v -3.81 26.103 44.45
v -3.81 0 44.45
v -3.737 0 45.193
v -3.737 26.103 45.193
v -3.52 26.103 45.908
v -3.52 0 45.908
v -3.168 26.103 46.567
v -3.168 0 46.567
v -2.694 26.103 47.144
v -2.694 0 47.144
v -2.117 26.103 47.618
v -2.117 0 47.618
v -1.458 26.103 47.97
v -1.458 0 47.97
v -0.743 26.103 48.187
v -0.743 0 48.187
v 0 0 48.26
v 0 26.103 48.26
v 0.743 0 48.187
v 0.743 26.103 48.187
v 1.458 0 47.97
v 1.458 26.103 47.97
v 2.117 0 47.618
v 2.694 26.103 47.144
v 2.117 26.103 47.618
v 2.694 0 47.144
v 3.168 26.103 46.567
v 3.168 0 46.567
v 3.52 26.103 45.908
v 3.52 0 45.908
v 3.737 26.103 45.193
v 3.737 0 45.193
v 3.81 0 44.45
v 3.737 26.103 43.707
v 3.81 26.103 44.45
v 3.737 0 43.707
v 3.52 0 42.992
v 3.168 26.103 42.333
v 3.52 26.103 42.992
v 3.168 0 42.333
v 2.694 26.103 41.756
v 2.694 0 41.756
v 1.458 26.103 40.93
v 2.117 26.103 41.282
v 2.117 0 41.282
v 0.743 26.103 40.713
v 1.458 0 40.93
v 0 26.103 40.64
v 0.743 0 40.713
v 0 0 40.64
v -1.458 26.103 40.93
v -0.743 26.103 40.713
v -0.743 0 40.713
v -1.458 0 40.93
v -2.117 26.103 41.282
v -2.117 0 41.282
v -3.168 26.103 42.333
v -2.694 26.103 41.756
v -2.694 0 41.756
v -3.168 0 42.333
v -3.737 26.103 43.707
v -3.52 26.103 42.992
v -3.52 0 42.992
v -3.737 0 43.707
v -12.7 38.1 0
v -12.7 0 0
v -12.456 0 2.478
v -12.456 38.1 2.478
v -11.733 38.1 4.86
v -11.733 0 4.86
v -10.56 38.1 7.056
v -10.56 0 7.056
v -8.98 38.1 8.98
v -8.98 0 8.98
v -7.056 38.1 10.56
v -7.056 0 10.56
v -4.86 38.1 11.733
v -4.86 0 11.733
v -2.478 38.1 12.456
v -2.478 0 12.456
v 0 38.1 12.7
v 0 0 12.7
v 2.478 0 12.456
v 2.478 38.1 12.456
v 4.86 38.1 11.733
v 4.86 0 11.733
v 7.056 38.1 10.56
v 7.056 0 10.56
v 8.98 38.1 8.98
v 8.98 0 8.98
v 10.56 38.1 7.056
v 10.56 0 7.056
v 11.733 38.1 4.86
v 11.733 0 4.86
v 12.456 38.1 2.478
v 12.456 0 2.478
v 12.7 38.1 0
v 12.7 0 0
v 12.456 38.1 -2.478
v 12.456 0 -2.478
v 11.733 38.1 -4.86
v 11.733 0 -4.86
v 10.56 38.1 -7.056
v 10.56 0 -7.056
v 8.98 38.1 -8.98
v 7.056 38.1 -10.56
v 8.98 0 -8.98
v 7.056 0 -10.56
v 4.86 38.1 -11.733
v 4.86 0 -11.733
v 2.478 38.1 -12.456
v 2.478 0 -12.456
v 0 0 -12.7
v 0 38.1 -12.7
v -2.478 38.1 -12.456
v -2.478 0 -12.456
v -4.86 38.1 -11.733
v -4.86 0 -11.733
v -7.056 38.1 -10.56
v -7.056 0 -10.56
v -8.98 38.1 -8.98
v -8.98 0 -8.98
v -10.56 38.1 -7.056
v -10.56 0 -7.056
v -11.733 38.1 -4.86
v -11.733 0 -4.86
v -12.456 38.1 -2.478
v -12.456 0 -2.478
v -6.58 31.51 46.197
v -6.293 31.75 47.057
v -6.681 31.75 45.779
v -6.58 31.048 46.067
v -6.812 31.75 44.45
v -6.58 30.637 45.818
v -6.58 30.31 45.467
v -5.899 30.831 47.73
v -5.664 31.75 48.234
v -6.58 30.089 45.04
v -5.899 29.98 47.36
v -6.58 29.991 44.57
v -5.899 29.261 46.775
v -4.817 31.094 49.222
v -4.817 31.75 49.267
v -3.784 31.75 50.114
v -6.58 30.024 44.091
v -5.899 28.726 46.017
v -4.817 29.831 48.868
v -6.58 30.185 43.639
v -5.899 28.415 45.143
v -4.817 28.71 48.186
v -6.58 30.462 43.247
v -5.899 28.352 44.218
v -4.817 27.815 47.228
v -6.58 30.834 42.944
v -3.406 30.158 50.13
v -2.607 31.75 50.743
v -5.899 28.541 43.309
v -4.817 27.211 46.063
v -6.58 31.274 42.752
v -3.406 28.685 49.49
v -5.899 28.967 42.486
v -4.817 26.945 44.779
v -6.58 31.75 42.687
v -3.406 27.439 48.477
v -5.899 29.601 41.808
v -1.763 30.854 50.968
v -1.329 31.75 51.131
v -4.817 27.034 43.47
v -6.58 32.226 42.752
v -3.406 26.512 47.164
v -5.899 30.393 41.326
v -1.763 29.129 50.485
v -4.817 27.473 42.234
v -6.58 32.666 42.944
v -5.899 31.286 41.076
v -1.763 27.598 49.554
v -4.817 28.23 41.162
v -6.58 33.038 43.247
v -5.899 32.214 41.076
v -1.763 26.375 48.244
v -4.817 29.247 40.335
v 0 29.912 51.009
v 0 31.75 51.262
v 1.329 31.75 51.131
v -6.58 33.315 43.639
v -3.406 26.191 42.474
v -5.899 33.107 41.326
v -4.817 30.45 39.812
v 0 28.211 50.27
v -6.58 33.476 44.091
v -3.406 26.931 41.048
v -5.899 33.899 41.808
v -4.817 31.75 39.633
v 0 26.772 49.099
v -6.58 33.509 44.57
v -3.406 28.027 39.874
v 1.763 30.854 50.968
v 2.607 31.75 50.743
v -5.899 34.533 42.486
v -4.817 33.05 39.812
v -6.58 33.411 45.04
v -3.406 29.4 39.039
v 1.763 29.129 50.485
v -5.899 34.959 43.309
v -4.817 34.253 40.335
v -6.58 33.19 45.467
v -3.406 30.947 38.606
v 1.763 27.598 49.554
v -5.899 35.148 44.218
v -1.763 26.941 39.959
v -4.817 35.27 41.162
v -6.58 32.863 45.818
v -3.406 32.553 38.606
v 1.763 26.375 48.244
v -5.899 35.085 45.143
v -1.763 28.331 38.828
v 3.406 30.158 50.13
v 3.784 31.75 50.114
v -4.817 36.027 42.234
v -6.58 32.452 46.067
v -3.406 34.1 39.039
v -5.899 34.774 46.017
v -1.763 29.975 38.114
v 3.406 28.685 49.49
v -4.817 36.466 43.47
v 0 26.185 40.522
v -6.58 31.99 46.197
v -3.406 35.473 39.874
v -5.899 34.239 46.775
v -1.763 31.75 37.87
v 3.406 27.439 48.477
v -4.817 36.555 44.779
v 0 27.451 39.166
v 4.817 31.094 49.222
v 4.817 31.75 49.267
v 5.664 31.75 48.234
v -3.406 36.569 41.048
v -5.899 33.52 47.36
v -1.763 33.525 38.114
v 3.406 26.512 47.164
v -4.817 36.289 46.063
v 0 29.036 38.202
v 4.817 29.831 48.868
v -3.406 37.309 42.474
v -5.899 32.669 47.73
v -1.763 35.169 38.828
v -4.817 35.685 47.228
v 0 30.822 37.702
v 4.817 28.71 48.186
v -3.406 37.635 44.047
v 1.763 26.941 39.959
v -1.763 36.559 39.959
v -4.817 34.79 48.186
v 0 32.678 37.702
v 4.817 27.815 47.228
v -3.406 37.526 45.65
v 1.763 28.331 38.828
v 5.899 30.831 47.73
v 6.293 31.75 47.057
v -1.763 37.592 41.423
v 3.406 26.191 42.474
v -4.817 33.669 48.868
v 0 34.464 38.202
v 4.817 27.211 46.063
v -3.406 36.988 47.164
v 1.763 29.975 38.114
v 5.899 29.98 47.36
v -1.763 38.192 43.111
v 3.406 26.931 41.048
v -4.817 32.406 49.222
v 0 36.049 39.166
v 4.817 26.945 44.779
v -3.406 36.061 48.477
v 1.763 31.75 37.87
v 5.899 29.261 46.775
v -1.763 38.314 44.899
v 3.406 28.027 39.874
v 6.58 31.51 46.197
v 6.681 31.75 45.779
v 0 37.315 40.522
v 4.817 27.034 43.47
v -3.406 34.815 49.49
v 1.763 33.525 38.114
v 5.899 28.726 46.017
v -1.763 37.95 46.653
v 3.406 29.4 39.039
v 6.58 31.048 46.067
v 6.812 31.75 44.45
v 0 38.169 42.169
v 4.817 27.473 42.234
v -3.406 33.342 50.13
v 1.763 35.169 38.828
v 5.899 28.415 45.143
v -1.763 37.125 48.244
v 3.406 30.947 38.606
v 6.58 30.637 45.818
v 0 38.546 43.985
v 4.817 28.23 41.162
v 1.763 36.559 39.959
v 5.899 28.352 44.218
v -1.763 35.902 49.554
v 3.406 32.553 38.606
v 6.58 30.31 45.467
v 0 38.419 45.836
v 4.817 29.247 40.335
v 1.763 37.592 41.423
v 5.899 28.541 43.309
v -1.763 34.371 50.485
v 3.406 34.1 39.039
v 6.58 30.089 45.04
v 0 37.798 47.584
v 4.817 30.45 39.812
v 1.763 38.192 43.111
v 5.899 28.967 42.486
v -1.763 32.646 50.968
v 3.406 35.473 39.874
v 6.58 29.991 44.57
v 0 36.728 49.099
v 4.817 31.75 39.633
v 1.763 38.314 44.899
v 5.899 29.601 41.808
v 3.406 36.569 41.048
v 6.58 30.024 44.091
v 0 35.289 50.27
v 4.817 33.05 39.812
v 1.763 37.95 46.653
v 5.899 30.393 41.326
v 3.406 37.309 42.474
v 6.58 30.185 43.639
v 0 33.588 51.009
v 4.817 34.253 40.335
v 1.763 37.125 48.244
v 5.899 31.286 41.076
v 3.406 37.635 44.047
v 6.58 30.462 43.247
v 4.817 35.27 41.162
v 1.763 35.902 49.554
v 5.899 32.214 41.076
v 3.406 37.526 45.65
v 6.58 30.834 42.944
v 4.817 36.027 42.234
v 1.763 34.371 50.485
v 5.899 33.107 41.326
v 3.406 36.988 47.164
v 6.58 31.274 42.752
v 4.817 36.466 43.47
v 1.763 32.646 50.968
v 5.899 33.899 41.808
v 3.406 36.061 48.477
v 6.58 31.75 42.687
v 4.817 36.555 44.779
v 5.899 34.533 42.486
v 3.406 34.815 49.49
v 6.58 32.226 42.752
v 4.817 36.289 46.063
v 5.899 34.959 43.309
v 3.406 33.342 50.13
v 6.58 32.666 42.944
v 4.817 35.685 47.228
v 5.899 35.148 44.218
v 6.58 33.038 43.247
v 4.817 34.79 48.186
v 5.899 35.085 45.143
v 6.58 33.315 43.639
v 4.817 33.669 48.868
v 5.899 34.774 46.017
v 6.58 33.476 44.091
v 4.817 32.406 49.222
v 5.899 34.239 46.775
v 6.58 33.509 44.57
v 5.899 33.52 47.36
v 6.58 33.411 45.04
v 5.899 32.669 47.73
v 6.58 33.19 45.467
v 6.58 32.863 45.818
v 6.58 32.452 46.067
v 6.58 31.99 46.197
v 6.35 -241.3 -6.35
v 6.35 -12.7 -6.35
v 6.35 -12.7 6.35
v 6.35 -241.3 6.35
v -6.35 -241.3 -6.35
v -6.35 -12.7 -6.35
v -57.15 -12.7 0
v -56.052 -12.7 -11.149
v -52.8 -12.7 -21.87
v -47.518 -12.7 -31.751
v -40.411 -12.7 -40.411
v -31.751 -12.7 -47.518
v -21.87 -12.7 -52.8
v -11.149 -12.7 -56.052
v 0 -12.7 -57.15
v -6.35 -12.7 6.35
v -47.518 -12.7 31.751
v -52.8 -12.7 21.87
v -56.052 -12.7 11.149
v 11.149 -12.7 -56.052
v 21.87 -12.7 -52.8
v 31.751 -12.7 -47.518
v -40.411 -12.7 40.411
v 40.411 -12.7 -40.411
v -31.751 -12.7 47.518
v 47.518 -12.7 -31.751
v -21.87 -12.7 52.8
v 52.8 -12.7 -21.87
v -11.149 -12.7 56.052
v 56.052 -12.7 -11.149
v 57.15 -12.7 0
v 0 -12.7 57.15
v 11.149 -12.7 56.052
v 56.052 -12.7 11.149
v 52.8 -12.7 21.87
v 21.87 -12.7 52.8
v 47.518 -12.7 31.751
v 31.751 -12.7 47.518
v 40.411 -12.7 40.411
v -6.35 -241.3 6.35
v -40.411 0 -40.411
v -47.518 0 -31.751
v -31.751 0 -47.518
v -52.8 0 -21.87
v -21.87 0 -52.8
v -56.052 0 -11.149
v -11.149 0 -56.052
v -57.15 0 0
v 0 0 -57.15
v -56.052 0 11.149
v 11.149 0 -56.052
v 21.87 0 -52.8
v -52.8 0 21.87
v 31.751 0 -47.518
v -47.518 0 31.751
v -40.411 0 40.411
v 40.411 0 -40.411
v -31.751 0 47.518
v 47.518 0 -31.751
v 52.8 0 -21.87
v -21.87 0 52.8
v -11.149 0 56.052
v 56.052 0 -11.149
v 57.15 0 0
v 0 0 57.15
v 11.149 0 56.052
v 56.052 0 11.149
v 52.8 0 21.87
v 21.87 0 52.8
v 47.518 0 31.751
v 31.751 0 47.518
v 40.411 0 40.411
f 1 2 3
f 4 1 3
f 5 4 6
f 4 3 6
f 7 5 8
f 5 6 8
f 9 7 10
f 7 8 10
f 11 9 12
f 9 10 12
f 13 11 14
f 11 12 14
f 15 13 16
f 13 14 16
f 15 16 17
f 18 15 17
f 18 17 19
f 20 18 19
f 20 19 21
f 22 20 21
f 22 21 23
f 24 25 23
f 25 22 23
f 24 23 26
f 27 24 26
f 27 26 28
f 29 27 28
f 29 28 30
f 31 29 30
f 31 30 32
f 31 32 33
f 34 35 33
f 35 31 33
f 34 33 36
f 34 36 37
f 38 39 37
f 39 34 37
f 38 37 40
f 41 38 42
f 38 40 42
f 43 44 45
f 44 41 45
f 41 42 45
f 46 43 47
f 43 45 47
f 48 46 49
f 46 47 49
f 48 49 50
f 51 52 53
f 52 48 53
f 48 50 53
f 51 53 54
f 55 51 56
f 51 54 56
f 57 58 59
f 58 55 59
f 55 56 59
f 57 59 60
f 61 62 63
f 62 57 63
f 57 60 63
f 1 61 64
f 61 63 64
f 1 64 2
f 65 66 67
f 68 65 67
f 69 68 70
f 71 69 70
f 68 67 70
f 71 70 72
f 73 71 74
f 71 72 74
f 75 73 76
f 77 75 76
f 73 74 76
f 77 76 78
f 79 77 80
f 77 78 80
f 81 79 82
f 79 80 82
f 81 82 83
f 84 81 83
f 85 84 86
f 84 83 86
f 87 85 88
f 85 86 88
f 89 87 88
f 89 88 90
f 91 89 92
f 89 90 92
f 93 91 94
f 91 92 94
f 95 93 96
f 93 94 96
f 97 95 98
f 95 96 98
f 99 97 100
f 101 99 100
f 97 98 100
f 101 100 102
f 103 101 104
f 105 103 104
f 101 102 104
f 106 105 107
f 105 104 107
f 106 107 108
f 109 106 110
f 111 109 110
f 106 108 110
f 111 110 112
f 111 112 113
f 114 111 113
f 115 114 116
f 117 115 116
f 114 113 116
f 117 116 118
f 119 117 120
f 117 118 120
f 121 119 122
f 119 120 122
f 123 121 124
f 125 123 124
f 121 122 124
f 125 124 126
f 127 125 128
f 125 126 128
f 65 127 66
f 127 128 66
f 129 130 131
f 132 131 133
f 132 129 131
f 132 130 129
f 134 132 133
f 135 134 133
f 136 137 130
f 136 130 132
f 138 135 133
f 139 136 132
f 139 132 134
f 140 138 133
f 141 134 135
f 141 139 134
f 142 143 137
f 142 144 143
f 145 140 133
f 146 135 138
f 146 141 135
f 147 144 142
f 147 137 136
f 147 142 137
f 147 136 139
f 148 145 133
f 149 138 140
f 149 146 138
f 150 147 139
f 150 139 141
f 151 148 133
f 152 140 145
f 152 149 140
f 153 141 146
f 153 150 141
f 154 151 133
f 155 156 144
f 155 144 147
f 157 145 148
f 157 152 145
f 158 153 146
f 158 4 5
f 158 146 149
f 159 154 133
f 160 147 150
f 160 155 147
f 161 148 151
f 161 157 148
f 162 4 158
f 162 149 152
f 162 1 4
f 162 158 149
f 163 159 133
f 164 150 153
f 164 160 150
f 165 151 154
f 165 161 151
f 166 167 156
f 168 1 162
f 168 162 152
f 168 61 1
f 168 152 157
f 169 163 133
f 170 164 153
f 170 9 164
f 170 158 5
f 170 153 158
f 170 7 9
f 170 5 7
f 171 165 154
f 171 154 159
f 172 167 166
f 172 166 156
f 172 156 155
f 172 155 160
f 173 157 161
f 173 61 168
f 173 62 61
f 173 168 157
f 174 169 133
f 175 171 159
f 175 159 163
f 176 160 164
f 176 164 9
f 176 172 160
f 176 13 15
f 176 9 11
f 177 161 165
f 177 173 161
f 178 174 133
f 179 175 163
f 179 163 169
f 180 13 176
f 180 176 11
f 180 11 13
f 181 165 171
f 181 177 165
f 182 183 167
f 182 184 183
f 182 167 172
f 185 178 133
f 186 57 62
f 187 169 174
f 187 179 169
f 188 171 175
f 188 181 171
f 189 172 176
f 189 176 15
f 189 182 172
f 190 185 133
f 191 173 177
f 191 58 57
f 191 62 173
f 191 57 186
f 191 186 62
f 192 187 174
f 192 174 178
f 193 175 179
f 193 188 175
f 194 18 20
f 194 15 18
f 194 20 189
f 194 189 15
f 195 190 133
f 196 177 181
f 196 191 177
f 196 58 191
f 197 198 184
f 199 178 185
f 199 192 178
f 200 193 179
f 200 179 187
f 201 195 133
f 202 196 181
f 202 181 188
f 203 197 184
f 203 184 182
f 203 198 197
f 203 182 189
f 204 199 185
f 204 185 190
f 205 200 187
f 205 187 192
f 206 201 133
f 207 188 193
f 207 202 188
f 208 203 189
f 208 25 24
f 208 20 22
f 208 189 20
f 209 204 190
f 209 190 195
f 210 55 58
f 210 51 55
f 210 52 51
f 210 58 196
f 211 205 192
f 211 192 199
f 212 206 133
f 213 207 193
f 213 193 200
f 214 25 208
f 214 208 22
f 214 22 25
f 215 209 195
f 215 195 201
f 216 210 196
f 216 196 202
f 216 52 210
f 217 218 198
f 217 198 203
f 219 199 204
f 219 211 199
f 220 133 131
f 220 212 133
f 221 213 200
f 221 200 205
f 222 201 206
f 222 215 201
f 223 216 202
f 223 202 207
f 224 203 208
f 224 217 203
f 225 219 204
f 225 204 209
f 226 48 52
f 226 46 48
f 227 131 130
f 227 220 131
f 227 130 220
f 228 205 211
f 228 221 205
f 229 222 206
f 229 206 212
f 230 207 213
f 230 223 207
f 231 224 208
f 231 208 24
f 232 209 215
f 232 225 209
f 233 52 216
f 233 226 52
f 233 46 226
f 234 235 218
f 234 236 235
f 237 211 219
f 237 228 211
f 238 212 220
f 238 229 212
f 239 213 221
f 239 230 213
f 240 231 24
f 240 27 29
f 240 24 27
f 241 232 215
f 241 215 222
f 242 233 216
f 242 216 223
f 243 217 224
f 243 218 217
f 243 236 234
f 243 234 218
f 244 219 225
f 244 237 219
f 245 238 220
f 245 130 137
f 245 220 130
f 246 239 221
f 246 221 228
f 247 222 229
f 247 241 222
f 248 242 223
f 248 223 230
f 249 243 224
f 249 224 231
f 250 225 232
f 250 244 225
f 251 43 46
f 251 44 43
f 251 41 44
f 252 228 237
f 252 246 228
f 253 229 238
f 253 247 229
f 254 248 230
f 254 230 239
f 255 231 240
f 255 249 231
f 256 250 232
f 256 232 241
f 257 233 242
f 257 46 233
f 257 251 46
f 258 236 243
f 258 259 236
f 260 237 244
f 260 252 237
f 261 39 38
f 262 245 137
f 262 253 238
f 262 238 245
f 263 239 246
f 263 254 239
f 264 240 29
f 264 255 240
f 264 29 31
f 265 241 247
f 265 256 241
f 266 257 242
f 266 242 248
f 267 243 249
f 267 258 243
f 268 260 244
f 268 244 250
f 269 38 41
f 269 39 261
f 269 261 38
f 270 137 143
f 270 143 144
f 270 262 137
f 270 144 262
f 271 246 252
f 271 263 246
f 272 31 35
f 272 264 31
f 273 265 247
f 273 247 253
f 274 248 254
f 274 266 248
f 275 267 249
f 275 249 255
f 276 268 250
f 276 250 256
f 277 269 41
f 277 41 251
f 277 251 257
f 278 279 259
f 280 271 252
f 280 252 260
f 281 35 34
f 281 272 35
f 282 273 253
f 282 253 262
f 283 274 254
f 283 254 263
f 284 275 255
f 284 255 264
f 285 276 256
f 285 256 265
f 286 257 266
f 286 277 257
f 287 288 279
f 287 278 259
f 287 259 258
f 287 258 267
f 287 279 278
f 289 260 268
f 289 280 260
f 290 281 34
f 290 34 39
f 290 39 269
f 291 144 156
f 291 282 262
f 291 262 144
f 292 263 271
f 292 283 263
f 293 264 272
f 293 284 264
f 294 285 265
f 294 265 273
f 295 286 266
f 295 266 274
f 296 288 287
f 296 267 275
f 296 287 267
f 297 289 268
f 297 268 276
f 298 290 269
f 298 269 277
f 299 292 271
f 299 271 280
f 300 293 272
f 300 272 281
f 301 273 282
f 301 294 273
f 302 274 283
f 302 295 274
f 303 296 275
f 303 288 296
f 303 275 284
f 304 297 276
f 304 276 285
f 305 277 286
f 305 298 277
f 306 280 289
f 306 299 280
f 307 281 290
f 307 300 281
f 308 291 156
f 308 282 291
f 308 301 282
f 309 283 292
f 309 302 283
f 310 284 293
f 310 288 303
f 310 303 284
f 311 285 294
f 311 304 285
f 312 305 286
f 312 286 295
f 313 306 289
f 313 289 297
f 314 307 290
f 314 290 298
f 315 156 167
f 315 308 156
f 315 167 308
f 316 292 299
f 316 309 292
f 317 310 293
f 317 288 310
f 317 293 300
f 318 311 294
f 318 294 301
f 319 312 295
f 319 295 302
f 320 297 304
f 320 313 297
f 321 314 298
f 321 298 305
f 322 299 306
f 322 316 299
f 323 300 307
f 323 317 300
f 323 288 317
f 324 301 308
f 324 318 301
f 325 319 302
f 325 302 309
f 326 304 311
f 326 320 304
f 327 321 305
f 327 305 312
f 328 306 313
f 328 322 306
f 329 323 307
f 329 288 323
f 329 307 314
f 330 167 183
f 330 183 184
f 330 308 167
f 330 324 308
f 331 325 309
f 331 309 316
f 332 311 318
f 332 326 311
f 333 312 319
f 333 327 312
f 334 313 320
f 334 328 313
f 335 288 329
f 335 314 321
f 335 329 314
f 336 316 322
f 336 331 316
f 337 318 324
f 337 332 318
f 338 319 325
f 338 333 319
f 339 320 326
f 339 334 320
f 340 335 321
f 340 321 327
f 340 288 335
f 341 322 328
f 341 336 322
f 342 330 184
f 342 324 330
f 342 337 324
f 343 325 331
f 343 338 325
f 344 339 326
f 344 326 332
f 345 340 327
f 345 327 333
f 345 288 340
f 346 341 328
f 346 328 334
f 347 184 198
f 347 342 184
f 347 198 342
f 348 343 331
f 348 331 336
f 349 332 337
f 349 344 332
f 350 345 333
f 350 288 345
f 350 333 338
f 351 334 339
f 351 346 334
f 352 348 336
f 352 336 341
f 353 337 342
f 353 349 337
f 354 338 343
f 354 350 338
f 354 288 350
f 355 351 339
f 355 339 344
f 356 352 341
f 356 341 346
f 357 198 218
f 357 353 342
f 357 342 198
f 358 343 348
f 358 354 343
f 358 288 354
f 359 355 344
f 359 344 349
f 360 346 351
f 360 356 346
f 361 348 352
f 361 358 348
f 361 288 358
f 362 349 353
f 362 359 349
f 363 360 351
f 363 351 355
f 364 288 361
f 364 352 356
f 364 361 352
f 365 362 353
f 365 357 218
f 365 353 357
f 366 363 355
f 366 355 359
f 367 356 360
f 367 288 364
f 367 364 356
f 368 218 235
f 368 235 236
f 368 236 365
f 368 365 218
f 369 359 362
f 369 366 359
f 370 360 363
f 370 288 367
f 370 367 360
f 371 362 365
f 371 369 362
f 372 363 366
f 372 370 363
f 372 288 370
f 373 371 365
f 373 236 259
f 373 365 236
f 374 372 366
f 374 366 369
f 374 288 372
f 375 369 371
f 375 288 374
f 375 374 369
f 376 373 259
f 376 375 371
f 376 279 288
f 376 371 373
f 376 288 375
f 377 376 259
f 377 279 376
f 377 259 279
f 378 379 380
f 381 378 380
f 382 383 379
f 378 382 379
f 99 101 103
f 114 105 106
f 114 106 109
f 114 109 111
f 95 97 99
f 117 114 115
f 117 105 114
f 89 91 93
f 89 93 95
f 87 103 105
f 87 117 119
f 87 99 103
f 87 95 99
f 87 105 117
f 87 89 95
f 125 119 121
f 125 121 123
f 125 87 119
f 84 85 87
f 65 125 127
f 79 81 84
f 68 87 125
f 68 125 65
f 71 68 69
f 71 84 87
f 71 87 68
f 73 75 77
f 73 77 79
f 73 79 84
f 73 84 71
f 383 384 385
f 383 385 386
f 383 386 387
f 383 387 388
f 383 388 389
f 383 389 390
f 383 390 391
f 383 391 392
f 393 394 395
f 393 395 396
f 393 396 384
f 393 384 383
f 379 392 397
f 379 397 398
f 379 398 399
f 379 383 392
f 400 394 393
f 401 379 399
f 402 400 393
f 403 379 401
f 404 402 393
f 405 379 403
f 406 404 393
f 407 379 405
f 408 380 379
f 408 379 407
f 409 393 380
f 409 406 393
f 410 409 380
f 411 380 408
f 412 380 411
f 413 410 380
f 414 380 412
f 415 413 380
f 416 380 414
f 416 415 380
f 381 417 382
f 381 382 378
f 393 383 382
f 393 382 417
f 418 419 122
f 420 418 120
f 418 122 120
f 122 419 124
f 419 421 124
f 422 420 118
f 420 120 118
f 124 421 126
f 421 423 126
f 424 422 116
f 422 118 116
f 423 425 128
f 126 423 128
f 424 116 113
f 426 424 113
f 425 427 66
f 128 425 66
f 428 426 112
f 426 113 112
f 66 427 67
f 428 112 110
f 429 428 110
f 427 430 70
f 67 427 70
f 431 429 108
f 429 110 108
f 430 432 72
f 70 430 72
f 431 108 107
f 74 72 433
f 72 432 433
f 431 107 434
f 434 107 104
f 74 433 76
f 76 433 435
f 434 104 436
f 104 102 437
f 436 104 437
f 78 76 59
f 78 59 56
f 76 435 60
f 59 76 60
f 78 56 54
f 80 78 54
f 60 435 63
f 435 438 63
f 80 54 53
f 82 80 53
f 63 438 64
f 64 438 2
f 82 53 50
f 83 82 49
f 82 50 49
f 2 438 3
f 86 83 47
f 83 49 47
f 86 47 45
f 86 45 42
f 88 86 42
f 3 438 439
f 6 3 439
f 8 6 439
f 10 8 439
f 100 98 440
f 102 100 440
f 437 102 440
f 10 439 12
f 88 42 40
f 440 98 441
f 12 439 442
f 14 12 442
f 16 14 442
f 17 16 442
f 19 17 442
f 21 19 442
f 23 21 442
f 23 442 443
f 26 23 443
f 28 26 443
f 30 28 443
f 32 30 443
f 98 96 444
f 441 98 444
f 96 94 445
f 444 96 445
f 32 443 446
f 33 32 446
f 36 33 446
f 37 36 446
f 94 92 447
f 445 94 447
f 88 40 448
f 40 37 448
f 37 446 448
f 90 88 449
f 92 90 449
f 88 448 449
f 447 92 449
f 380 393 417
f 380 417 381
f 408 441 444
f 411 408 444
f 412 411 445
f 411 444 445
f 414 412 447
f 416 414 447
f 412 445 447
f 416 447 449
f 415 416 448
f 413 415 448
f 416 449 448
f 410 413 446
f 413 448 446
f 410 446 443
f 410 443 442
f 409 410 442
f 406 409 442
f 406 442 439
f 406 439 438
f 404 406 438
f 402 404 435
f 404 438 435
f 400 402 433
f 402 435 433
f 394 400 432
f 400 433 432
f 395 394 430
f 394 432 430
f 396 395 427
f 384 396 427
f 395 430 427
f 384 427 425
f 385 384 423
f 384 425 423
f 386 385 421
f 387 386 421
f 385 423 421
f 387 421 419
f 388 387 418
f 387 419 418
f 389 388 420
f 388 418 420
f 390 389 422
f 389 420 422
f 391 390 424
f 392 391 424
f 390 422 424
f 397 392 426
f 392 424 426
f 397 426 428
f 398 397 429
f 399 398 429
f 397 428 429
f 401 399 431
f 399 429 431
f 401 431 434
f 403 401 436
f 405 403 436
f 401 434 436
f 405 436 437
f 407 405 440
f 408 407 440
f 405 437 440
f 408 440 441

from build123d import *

# Parameters (mm, degrees)
F0_R     = 57.15
F1_DEPTH = 12.7
F2_W     = 12.7
F2_H     = 12.7
F3_DEPTH = 228.6
F4_R     = 12.7
F5_DEPTH = 38.1
F6_R     = 3.81
F7_DEPTH = 31.75


with BuildPart() as f1:
    # F0 (on Front) → F1 (new body)
    with BuildSketch(Plane.XZ):
        Circle(F0_R)
    extrude(amount=F1_DEPTH)

    # F2 (on face) → F3 (join)
    with BuildSketch(Plane.XZ.offset(12.7)):
        Rectangle(F2_W, F2_H)
    extrude(amount=F3_DEPTH)

    # F4 (on face) → F5 (join)
    with BuildSketch(Plane(origin=(0, 0, 0), x_dir=(-1, 0, 0), z_dir=(0, 1, 0))):
        Circle(F4_R)
    extrude(amount=F5_DEPTH)

    # F6 (on face) → F7 (join)
    with BuildSketch(Plane(origin=(0, 0, 0), x_dir=(-1, 0, 0), z_dir=(0, 1, 0))):
        with Locations((0, 44.45)):
            Circle(F6_R)
    extrude(amount=F7_DEPTH)

    # F8 (on face) → F9 (revolve)
    with BuildSketch(Plane(origin=(0, 31.75, 0), x_dir=(-1, 0, 0), z_dir=(0, 1, 0))):
        with BuildLine():
            ThreePointArc((-3.81, 44.45), (0, 48.26), (3.81, 44.45))
            Line((3.81, 44.45), (6.8118199706, 44.45))
            ThreePointArc((6.8118199706, 44.45), (0, 51.2618199706), (-6.8118199706, 44.45))
            Line((-6.8118199706, 44.45), (-3.81, 44.45))
        make_face()
        with BuildLine():
            Line((-3.81, 44.45), (3.81, 44.45))
            ThreePointArc((3.81, 44.45), (0, 48.26), (-3.81, 44.45))
        make_face()
    revolve(axis=Axis((15.5152343214, 31.75, 44.45), (1, 0, 0)))


solid = f1.part
